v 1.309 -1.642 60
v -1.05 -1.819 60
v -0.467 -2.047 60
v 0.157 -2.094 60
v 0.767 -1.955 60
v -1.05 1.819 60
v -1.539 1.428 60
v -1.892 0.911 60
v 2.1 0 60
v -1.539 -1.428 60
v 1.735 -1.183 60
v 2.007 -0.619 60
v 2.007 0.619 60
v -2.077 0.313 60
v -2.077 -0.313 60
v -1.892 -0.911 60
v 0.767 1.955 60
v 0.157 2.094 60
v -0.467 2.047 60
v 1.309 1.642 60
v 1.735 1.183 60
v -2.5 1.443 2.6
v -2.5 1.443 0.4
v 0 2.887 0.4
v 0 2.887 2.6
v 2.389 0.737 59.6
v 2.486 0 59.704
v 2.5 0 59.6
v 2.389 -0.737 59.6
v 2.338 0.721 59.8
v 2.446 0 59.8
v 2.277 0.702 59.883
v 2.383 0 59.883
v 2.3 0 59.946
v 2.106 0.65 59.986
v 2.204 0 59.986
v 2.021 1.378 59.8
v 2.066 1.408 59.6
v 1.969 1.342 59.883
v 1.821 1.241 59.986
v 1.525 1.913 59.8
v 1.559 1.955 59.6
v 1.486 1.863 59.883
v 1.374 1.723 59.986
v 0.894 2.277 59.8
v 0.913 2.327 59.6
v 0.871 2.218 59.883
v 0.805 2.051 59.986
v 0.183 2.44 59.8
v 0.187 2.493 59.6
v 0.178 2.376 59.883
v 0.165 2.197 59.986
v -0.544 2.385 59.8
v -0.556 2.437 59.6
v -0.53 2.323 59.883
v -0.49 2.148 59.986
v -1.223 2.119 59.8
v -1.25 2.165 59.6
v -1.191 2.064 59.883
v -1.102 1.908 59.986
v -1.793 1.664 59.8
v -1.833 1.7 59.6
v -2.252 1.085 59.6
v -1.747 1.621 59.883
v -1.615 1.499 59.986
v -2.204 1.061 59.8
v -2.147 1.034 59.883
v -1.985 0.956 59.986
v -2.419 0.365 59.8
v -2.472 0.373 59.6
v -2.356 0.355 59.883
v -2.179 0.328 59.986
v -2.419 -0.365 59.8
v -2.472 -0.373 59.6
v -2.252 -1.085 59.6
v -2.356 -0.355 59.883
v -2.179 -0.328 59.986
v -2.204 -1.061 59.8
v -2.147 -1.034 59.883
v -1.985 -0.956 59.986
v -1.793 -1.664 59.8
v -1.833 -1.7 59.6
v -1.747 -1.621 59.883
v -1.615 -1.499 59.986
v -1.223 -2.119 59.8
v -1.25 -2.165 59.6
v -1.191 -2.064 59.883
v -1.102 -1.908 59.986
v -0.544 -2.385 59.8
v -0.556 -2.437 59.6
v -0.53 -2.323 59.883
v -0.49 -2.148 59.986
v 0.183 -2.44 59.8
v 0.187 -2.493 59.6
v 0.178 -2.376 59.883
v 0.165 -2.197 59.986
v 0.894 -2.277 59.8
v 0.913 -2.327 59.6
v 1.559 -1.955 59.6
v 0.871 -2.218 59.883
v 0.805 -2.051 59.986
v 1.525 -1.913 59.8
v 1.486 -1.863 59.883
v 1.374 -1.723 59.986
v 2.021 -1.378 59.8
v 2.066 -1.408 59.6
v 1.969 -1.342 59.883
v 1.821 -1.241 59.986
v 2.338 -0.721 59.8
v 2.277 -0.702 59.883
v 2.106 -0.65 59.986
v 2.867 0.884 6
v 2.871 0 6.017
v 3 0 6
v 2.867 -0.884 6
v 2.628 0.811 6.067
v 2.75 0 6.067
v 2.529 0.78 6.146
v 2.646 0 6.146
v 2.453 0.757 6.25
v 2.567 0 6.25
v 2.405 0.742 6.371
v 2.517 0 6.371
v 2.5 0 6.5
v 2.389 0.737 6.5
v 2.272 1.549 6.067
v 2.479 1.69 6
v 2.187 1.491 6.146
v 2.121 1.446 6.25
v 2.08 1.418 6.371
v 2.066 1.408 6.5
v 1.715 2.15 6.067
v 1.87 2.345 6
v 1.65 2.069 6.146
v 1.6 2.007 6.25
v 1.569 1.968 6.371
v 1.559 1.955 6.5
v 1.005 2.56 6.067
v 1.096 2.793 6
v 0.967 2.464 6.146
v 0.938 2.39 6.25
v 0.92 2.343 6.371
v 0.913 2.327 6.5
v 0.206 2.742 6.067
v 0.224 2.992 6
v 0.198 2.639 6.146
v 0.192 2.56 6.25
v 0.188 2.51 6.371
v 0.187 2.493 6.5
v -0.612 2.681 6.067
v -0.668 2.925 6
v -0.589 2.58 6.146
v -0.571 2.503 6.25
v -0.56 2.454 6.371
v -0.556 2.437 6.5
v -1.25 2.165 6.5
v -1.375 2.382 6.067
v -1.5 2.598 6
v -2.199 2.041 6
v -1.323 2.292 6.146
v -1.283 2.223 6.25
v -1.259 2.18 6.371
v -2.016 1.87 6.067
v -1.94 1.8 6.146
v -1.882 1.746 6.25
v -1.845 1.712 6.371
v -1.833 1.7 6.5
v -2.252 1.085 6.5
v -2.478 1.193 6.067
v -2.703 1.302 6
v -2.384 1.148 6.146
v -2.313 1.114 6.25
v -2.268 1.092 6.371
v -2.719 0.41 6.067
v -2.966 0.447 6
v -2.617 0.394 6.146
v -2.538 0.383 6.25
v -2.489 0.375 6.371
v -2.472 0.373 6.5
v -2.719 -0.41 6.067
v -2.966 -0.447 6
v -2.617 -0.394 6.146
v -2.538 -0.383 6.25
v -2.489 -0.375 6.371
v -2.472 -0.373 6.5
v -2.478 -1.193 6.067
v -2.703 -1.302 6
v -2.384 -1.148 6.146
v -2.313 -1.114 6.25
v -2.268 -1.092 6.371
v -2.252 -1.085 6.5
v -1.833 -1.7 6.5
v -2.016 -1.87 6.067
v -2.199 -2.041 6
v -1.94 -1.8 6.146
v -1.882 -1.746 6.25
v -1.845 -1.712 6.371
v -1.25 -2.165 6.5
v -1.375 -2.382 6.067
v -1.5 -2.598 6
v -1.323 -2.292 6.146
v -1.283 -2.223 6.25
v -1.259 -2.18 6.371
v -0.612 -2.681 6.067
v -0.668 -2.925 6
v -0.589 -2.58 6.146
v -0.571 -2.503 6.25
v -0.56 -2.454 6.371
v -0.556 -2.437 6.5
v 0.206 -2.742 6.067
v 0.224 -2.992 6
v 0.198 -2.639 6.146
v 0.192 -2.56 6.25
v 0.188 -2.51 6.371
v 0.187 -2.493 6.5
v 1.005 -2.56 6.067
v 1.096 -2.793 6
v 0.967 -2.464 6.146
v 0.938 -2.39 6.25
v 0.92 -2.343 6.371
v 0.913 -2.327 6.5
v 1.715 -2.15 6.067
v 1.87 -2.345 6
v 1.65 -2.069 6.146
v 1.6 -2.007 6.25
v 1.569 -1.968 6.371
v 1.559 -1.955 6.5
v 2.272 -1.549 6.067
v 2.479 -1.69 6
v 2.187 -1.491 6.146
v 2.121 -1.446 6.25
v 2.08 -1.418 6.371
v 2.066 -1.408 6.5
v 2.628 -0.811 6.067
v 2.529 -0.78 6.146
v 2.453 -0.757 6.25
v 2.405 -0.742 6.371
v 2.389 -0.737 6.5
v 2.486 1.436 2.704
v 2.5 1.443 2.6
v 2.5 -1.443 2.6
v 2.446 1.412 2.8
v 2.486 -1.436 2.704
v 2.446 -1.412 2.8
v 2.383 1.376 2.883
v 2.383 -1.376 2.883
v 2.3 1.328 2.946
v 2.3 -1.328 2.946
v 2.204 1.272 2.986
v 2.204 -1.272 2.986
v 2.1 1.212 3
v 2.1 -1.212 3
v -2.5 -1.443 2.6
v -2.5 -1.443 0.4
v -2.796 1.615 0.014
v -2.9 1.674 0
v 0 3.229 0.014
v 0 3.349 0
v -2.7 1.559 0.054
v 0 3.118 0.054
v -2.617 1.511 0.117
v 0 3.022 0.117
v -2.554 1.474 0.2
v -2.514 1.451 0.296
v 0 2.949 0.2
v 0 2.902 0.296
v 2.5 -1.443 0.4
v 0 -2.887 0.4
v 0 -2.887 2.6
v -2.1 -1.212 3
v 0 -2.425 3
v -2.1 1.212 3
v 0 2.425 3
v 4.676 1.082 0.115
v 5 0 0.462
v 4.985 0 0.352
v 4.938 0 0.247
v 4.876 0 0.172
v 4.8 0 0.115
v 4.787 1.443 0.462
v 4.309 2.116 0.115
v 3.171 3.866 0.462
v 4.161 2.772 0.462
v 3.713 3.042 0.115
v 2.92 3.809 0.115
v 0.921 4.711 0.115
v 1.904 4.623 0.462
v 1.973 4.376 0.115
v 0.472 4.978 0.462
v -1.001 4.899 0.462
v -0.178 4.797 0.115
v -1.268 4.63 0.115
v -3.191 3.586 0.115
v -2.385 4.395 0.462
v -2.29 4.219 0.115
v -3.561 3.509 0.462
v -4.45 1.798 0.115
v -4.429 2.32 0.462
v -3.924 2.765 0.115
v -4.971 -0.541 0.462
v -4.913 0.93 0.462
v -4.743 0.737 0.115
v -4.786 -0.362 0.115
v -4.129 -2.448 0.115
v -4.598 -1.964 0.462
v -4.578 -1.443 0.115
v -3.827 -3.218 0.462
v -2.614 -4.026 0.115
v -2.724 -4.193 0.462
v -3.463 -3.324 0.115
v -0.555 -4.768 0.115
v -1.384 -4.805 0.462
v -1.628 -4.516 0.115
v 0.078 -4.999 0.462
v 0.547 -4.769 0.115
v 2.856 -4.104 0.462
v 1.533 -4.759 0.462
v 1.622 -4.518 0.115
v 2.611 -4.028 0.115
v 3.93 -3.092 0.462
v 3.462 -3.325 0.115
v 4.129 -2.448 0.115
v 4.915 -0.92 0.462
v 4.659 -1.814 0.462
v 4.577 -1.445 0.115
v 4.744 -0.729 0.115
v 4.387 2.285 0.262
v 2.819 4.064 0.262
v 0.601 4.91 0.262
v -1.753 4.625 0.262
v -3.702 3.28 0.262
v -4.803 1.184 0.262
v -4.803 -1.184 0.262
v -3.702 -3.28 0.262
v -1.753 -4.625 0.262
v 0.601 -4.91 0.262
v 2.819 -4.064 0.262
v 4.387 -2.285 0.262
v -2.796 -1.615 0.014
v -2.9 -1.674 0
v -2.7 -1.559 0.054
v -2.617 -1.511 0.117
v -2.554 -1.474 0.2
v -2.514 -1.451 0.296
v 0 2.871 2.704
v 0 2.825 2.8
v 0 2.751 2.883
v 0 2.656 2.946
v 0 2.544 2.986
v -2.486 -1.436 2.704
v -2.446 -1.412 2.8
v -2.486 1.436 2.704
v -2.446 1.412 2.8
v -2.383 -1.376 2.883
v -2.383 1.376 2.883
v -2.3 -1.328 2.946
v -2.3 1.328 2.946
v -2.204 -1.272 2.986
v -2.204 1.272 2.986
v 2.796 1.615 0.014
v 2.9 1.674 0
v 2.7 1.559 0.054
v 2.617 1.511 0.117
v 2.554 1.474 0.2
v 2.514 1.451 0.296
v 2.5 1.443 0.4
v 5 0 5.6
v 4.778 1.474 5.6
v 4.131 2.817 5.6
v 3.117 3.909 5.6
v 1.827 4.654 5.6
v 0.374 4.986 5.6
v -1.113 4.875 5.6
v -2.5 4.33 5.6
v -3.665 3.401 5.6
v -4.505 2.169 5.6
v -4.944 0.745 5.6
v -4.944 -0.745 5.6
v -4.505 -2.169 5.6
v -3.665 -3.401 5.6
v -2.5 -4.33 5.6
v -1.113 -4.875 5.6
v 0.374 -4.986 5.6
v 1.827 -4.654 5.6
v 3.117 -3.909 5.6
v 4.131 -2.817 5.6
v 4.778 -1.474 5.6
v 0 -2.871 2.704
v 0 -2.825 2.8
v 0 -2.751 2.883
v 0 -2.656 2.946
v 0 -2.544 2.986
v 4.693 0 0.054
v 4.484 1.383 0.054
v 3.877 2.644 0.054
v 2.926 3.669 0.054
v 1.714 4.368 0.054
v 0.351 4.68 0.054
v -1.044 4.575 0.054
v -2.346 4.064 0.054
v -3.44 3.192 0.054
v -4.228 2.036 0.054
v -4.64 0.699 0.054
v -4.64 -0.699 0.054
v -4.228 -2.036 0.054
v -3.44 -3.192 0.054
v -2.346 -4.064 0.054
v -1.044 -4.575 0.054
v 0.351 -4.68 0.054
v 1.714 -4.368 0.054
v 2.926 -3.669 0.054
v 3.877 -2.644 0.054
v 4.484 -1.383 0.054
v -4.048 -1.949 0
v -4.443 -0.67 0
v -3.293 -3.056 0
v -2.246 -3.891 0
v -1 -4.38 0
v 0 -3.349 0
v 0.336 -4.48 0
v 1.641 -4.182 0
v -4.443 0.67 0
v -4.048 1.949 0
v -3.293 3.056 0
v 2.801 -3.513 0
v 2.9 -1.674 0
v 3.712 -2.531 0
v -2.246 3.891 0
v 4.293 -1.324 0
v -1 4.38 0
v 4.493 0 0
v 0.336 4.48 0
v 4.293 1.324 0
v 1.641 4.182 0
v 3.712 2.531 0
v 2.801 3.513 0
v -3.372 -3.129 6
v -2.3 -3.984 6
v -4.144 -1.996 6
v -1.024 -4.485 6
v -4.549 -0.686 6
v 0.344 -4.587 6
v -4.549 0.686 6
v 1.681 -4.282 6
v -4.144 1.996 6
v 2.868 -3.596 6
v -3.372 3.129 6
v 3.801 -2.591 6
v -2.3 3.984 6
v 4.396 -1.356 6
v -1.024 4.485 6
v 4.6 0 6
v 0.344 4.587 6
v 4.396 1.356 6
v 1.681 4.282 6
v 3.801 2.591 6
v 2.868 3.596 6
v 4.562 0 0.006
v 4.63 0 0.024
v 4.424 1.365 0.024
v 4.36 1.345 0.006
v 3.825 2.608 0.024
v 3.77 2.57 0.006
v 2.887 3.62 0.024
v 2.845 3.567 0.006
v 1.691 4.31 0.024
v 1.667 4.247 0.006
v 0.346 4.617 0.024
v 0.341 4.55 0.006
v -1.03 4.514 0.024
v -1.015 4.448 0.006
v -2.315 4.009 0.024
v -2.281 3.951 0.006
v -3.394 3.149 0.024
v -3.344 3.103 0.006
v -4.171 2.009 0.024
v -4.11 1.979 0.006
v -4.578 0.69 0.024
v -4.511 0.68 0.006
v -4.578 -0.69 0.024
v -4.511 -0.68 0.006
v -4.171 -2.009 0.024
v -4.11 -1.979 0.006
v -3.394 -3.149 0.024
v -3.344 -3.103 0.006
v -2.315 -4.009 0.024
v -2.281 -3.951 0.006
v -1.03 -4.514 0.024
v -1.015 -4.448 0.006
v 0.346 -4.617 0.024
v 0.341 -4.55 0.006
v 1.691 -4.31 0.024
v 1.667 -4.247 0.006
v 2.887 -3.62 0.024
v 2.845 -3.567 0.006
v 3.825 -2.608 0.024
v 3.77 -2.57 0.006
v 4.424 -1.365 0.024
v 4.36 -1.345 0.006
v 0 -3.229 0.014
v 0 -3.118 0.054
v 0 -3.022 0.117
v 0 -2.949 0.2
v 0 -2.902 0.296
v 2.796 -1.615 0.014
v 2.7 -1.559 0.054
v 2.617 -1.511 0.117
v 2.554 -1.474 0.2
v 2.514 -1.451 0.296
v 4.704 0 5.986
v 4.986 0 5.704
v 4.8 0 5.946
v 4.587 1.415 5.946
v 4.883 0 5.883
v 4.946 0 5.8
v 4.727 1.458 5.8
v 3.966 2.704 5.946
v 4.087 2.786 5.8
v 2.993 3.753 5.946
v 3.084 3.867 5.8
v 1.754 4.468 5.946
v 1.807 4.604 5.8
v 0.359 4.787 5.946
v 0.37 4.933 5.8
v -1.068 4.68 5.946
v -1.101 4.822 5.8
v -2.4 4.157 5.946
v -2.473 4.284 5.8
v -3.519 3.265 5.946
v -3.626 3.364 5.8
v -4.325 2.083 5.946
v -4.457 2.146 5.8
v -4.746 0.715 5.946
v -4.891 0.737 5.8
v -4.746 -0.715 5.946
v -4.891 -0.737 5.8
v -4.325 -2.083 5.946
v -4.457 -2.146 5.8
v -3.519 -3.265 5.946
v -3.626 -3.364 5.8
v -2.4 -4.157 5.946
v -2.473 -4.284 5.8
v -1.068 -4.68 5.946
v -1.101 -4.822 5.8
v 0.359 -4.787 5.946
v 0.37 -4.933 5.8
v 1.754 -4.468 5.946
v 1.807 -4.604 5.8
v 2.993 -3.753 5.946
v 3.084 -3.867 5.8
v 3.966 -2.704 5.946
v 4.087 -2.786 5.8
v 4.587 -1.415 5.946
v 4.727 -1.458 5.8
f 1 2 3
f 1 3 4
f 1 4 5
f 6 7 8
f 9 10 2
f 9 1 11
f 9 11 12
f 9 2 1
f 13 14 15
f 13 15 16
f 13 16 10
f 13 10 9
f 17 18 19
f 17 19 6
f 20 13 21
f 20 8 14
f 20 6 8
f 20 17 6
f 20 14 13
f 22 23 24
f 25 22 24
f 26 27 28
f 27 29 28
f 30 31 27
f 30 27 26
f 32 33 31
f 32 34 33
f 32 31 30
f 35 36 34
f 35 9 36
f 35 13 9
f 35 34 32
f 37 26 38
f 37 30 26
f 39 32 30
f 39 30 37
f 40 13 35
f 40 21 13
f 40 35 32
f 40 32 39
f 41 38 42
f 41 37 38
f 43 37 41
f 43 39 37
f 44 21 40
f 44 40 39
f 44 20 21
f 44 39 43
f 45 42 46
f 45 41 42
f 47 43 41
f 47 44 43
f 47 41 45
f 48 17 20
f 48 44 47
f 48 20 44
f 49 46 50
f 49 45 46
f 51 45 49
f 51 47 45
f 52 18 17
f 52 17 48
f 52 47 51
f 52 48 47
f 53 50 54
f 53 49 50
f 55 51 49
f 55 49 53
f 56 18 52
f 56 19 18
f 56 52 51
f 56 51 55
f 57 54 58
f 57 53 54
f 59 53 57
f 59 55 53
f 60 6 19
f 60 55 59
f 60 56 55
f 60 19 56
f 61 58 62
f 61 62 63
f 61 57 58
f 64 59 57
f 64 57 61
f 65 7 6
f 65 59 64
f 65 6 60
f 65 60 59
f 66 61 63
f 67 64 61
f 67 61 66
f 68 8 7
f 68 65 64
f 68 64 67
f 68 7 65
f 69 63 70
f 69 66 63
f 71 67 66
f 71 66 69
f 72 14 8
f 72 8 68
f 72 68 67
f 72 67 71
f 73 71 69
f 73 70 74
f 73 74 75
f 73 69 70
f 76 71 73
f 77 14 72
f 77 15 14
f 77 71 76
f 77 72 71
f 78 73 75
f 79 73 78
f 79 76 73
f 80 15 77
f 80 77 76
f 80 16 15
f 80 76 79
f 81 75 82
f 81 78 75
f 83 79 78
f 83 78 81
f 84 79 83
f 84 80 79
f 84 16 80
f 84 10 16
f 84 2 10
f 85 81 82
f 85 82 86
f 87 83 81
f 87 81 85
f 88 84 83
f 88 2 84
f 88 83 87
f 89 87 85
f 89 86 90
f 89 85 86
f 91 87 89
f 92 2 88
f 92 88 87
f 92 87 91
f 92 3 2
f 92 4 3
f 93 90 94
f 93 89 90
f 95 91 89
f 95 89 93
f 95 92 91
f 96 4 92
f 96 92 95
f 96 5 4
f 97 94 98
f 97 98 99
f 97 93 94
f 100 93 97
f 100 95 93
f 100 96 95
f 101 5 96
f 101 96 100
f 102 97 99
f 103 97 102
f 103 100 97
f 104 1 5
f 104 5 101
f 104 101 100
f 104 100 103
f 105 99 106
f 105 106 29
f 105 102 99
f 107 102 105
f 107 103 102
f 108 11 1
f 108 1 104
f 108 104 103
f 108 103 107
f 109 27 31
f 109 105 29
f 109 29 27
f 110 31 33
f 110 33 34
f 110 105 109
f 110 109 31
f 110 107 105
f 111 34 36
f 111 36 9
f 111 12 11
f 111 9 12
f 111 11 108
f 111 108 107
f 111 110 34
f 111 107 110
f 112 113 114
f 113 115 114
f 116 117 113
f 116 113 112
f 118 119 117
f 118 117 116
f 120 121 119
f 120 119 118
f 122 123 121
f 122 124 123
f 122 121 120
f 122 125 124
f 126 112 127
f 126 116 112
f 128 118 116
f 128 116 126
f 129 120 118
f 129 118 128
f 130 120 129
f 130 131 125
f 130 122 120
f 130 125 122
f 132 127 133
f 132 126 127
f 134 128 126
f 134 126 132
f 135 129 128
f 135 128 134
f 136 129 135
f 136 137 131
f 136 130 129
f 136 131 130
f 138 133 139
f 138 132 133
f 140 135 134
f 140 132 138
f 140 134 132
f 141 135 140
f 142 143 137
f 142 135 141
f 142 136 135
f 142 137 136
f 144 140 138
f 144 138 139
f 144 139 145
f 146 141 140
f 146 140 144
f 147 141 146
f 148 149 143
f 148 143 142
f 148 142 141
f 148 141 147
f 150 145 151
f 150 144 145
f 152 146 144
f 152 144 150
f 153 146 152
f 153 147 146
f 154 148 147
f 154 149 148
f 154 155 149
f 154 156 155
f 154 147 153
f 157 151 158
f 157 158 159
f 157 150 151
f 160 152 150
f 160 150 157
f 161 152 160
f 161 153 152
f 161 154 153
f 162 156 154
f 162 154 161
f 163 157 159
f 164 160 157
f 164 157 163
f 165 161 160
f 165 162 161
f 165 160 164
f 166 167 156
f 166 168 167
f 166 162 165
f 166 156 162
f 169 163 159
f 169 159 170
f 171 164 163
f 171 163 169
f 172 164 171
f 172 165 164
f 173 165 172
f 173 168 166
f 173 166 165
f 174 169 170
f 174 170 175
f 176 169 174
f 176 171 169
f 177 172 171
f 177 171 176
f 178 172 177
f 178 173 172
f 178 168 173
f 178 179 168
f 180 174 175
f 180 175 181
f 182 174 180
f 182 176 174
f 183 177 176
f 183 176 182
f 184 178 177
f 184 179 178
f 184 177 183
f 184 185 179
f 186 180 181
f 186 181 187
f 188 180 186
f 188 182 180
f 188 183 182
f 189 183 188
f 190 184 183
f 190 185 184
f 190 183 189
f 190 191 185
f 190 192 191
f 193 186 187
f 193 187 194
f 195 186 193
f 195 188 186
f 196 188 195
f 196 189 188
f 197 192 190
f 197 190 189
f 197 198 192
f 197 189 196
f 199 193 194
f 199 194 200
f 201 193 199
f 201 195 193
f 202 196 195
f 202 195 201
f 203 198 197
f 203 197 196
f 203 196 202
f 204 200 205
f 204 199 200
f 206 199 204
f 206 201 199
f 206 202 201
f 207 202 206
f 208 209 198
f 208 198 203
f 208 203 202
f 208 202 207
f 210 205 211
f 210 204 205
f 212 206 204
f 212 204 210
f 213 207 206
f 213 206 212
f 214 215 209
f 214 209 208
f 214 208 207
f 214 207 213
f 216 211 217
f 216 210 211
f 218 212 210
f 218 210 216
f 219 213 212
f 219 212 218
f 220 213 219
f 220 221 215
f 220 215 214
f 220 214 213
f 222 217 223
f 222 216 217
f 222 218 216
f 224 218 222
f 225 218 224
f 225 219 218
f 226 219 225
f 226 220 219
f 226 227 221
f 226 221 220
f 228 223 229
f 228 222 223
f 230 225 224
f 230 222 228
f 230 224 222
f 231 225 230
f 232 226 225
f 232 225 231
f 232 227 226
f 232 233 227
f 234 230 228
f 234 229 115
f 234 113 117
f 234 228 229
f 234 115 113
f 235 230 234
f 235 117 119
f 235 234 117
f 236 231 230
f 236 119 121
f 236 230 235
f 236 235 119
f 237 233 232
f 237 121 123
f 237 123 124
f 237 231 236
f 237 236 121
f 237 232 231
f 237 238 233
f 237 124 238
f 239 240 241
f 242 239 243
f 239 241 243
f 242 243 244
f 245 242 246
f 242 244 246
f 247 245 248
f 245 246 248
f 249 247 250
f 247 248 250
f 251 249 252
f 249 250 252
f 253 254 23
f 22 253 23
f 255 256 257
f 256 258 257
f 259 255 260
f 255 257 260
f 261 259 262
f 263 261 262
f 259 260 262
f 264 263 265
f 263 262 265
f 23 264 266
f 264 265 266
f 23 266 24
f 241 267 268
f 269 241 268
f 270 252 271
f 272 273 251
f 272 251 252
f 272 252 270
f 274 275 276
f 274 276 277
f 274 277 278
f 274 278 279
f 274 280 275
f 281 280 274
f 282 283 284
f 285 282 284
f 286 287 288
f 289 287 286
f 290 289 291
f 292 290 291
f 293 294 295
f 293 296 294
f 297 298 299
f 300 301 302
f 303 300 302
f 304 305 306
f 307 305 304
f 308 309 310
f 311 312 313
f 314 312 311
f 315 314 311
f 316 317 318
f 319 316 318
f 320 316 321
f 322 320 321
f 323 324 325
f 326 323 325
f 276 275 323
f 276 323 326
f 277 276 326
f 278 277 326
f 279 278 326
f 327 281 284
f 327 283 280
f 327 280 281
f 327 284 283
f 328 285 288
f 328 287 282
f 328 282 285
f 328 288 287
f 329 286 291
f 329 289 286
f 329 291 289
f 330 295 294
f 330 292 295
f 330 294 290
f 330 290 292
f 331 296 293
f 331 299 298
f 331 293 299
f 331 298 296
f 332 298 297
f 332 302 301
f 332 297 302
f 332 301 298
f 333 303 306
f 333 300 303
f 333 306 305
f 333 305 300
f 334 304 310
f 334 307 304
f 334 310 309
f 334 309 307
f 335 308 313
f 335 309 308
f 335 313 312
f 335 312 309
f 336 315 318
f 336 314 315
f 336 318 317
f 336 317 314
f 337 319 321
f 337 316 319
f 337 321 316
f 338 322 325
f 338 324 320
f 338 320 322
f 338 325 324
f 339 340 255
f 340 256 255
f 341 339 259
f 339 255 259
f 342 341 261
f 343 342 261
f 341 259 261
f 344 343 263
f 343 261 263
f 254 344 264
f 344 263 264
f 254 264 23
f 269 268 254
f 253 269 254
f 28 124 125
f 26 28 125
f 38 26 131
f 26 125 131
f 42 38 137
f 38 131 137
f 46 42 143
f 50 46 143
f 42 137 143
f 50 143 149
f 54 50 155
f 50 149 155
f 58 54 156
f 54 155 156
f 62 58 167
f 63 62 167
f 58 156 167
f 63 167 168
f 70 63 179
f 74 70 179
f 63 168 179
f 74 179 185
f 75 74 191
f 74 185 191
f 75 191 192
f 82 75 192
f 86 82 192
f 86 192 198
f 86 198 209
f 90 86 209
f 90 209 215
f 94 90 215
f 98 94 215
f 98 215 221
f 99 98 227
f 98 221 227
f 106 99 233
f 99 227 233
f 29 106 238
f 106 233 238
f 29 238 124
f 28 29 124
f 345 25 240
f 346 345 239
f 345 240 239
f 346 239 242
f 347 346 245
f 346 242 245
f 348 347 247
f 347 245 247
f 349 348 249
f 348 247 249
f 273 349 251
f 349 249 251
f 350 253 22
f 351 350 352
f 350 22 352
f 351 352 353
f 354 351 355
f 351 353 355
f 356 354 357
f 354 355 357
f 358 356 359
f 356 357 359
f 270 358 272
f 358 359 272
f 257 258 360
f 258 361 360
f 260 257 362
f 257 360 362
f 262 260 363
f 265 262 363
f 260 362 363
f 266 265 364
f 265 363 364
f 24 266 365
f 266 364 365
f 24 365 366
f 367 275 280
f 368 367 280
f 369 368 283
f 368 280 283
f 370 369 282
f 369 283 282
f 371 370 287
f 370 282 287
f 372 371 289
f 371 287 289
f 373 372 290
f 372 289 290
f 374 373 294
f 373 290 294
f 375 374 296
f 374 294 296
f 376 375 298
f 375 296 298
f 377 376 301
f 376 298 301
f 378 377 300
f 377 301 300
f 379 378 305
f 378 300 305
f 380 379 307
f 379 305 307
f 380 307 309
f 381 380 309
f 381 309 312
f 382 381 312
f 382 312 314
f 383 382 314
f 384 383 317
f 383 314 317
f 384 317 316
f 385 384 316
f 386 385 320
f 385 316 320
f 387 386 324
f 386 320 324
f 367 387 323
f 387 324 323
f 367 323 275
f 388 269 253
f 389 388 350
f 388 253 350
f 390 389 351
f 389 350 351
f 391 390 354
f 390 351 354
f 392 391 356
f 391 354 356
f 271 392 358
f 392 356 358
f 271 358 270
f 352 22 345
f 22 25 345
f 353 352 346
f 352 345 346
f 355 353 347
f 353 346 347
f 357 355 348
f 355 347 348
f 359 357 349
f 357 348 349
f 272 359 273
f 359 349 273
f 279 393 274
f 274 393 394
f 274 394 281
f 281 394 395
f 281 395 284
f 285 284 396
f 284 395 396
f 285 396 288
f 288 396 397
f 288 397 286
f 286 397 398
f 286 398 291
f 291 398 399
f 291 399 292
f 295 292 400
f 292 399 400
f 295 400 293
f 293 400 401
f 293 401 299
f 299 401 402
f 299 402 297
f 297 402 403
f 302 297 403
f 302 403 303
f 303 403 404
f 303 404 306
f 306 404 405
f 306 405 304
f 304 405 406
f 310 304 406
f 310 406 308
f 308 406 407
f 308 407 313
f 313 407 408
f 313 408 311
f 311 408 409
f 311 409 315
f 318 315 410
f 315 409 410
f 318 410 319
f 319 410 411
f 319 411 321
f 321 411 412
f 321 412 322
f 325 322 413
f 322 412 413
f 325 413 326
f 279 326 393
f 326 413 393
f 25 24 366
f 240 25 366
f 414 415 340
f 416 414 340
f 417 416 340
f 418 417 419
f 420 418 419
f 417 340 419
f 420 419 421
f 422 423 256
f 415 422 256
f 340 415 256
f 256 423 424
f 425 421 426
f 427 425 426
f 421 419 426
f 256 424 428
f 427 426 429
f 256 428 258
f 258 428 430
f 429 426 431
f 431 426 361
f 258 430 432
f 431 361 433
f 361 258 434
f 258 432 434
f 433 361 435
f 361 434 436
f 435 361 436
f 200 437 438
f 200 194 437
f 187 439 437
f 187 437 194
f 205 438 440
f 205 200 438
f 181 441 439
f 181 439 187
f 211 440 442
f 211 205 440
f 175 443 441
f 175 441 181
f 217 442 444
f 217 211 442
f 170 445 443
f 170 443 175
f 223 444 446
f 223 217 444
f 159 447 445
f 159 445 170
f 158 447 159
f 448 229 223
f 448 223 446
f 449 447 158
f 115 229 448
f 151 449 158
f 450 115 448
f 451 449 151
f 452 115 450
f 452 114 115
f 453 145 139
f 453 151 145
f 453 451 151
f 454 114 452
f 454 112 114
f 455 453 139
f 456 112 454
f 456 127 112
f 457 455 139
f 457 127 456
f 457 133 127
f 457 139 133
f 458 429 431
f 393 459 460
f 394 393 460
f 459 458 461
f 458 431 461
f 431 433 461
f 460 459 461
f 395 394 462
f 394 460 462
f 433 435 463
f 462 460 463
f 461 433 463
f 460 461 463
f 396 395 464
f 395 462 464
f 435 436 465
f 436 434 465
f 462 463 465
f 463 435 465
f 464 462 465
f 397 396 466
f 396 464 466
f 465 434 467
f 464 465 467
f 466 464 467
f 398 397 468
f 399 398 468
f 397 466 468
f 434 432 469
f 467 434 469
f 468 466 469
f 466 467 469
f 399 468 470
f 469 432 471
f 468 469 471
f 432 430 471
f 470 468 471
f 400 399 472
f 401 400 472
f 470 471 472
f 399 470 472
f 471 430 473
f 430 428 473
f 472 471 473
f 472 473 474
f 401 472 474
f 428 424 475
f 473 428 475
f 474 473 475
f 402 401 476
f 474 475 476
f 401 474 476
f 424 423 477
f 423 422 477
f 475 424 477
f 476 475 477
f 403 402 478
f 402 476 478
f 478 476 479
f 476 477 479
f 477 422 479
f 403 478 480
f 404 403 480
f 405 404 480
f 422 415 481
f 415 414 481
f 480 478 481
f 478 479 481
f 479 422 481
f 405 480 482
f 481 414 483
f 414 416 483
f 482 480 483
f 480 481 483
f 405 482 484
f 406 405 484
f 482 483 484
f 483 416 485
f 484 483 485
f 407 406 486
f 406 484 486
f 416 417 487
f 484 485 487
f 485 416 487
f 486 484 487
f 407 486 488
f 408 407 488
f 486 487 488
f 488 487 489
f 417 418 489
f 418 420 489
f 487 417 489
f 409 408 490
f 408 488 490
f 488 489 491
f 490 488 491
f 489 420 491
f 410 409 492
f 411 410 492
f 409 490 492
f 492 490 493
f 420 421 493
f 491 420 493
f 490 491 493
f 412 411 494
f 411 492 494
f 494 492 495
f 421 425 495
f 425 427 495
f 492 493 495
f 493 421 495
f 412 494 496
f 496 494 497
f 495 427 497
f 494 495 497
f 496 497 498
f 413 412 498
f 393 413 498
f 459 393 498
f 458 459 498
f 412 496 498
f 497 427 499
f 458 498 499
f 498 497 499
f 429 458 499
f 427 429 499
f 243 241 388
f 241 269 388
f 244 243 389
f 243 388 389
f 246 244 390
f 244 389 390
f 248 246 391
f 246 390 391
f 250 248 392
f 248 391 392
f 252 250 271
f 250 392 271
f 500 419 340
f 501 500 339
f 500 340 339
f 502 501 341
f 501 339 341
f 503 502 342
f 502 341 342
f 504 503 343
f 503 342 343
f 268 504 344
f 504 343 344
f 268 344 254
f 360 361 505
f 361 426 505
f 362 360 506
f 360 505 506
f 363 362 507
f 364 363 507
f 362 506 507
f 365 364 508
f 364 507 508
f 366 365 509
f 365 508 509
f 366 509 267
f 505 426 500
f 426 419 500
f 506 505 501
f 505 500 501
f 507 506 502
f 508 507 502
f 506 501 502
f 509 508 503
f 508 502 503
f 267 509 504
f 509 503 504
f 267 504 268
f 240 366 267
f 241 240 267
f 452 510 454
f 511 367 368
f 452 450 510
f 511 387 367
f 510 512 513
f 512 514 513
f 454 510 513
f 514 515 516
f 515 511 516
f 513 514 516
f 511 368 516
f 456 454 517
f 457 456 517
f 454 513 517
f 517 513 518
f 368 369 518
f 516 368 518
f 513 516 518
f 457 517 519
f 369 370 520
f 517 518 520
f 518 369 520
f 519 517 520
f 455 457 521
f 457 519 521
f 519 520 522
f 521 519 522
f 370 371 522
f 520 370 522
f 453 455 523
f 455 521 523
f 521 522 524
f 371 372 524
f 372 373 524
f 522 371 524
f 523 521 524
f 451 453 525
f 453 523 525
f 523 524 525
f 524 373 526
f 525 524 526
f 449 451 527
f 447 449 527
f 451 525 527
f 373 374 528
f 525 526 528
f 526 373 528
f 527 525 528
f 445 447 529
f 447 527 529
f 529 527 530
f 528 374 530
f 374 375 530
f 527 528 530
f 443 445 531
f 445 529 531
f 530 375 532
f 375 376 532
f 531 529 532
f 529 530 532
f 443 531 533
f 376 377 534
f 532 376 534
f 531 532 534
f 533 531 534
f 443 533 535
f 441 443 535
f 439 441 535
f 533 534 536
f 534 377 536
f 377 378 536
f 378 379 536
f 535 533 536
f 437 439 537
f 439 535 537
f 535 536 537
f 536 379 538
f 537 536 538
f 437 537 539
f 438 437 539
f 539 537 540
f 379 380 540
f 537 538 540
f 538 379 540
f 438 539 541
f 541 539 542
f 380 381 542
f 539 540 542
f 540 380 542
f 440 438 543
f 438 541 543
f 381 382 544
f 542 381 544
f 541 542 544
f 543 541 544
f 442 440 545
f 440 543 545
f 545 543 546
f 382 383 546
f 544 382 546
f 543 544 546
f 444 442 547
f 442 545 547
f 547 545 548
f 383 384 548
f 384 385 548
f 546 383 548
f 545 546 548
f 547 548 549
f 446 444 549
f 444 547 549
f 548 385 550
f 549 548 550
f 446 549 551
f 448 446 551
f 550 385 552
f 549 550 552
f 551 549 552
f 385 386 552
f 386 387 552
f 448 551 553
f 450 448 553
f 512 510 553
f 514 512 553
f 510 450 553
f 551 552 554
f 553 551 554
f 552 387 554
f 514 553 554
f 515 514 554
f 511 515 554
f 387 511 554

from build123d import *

# Parameters (mm, degrees)
SKETCH_1_R            = 5
EXTRUDE_490_DEPTH     = 6
SKETCH_2_R            = 2.5
EXTRUDE_581_DEPTH     = 54
CUT_EXTRUDE_774_DEPTH = 3
CHAMFER_830_SIZE2     = 0.4
CHAMFER_830_SIZE      = 0.230940108
FILLET_881_R          = 0.5
FILLET_2_R            = 0.4


with BuildPart() as part:
    # 草圖1 → Extrude 490 (new body)
    with BuildSketch(Plane.XY):
        Circle(SKETCH_1_R)
    extrude(amount=EXTRUDE_490_DEPTH)

    # 草圖2 → Extrude 581 (add)
    with BuildSketch(Plane.XY.offset(6)):
        Circle(SKETCH_2_R)
    extrude(amount=EXTRUDE_581_DEPTH)

    # 草圖3 → Cut-Extrude 774 (cut)
    with BuildSketch(Plane(origin=(0, 0, 0), x_dir=(-1, 0, 0), z_dir=(0, 0, -1))):
        Polygon((2.5, -1.443375673), (2.5, 1.443375673), (0, 2.886751346), (-2.5, 1.443375673), (-2.5, -1.443375673), (0, -2.886751346), align=None)
    extrude(amount=-CUT_EXTRUDE_774_DEPTH, mode=Mode.SUBTRACT)

    # Chamfer 830
    chamfer_830_edges = [part.edges().sort_by_distance(p)[0] for p in [
        (-5, 0, 0),
    ]]
    chamfer(chamfer_830_edges, length=CHAMFER_830_SIZE, length2=CHAMFER_830_SIZE2)

    # Fillet 881
    fillet_881_edges = [part.edges().sort_by_distance(p)[0] for p in [
        (-2.5, 0, 6),
    ]]
    fillet(fillet_881_edges, radius=FILLET_881_R)

    # 圓角2
    fillet_2_edges = [part.edges().sort_by_distance(p)[0] for p in [
        (-1.25, -2.165063509, 3),
        (1.25, -2.165063509, 3),
        (2.5, 0, 3),
        (1.25, 2.165063509, 3),
        (-1.25, 2.165063509, 3),
        (-2.5, 0, 3),
        (-1.25, -2.165063509, 0),
        (-2.5, 0, 0),
        (-1.25, 2.165063509, 0),
        (1.25, 2.165063509, 0),
        (2.5, 0, 0),
        (1.25, -2.165063509, 0),
        (-5, 0, 0.230940108),
        (-4.6, 0, 0),
        (-5, 0, 6),
        (-2.5, 0, 60),
    ]]
    fillet(fillet_2_edges, radius=FILLET_2_R)


solid = part.part
